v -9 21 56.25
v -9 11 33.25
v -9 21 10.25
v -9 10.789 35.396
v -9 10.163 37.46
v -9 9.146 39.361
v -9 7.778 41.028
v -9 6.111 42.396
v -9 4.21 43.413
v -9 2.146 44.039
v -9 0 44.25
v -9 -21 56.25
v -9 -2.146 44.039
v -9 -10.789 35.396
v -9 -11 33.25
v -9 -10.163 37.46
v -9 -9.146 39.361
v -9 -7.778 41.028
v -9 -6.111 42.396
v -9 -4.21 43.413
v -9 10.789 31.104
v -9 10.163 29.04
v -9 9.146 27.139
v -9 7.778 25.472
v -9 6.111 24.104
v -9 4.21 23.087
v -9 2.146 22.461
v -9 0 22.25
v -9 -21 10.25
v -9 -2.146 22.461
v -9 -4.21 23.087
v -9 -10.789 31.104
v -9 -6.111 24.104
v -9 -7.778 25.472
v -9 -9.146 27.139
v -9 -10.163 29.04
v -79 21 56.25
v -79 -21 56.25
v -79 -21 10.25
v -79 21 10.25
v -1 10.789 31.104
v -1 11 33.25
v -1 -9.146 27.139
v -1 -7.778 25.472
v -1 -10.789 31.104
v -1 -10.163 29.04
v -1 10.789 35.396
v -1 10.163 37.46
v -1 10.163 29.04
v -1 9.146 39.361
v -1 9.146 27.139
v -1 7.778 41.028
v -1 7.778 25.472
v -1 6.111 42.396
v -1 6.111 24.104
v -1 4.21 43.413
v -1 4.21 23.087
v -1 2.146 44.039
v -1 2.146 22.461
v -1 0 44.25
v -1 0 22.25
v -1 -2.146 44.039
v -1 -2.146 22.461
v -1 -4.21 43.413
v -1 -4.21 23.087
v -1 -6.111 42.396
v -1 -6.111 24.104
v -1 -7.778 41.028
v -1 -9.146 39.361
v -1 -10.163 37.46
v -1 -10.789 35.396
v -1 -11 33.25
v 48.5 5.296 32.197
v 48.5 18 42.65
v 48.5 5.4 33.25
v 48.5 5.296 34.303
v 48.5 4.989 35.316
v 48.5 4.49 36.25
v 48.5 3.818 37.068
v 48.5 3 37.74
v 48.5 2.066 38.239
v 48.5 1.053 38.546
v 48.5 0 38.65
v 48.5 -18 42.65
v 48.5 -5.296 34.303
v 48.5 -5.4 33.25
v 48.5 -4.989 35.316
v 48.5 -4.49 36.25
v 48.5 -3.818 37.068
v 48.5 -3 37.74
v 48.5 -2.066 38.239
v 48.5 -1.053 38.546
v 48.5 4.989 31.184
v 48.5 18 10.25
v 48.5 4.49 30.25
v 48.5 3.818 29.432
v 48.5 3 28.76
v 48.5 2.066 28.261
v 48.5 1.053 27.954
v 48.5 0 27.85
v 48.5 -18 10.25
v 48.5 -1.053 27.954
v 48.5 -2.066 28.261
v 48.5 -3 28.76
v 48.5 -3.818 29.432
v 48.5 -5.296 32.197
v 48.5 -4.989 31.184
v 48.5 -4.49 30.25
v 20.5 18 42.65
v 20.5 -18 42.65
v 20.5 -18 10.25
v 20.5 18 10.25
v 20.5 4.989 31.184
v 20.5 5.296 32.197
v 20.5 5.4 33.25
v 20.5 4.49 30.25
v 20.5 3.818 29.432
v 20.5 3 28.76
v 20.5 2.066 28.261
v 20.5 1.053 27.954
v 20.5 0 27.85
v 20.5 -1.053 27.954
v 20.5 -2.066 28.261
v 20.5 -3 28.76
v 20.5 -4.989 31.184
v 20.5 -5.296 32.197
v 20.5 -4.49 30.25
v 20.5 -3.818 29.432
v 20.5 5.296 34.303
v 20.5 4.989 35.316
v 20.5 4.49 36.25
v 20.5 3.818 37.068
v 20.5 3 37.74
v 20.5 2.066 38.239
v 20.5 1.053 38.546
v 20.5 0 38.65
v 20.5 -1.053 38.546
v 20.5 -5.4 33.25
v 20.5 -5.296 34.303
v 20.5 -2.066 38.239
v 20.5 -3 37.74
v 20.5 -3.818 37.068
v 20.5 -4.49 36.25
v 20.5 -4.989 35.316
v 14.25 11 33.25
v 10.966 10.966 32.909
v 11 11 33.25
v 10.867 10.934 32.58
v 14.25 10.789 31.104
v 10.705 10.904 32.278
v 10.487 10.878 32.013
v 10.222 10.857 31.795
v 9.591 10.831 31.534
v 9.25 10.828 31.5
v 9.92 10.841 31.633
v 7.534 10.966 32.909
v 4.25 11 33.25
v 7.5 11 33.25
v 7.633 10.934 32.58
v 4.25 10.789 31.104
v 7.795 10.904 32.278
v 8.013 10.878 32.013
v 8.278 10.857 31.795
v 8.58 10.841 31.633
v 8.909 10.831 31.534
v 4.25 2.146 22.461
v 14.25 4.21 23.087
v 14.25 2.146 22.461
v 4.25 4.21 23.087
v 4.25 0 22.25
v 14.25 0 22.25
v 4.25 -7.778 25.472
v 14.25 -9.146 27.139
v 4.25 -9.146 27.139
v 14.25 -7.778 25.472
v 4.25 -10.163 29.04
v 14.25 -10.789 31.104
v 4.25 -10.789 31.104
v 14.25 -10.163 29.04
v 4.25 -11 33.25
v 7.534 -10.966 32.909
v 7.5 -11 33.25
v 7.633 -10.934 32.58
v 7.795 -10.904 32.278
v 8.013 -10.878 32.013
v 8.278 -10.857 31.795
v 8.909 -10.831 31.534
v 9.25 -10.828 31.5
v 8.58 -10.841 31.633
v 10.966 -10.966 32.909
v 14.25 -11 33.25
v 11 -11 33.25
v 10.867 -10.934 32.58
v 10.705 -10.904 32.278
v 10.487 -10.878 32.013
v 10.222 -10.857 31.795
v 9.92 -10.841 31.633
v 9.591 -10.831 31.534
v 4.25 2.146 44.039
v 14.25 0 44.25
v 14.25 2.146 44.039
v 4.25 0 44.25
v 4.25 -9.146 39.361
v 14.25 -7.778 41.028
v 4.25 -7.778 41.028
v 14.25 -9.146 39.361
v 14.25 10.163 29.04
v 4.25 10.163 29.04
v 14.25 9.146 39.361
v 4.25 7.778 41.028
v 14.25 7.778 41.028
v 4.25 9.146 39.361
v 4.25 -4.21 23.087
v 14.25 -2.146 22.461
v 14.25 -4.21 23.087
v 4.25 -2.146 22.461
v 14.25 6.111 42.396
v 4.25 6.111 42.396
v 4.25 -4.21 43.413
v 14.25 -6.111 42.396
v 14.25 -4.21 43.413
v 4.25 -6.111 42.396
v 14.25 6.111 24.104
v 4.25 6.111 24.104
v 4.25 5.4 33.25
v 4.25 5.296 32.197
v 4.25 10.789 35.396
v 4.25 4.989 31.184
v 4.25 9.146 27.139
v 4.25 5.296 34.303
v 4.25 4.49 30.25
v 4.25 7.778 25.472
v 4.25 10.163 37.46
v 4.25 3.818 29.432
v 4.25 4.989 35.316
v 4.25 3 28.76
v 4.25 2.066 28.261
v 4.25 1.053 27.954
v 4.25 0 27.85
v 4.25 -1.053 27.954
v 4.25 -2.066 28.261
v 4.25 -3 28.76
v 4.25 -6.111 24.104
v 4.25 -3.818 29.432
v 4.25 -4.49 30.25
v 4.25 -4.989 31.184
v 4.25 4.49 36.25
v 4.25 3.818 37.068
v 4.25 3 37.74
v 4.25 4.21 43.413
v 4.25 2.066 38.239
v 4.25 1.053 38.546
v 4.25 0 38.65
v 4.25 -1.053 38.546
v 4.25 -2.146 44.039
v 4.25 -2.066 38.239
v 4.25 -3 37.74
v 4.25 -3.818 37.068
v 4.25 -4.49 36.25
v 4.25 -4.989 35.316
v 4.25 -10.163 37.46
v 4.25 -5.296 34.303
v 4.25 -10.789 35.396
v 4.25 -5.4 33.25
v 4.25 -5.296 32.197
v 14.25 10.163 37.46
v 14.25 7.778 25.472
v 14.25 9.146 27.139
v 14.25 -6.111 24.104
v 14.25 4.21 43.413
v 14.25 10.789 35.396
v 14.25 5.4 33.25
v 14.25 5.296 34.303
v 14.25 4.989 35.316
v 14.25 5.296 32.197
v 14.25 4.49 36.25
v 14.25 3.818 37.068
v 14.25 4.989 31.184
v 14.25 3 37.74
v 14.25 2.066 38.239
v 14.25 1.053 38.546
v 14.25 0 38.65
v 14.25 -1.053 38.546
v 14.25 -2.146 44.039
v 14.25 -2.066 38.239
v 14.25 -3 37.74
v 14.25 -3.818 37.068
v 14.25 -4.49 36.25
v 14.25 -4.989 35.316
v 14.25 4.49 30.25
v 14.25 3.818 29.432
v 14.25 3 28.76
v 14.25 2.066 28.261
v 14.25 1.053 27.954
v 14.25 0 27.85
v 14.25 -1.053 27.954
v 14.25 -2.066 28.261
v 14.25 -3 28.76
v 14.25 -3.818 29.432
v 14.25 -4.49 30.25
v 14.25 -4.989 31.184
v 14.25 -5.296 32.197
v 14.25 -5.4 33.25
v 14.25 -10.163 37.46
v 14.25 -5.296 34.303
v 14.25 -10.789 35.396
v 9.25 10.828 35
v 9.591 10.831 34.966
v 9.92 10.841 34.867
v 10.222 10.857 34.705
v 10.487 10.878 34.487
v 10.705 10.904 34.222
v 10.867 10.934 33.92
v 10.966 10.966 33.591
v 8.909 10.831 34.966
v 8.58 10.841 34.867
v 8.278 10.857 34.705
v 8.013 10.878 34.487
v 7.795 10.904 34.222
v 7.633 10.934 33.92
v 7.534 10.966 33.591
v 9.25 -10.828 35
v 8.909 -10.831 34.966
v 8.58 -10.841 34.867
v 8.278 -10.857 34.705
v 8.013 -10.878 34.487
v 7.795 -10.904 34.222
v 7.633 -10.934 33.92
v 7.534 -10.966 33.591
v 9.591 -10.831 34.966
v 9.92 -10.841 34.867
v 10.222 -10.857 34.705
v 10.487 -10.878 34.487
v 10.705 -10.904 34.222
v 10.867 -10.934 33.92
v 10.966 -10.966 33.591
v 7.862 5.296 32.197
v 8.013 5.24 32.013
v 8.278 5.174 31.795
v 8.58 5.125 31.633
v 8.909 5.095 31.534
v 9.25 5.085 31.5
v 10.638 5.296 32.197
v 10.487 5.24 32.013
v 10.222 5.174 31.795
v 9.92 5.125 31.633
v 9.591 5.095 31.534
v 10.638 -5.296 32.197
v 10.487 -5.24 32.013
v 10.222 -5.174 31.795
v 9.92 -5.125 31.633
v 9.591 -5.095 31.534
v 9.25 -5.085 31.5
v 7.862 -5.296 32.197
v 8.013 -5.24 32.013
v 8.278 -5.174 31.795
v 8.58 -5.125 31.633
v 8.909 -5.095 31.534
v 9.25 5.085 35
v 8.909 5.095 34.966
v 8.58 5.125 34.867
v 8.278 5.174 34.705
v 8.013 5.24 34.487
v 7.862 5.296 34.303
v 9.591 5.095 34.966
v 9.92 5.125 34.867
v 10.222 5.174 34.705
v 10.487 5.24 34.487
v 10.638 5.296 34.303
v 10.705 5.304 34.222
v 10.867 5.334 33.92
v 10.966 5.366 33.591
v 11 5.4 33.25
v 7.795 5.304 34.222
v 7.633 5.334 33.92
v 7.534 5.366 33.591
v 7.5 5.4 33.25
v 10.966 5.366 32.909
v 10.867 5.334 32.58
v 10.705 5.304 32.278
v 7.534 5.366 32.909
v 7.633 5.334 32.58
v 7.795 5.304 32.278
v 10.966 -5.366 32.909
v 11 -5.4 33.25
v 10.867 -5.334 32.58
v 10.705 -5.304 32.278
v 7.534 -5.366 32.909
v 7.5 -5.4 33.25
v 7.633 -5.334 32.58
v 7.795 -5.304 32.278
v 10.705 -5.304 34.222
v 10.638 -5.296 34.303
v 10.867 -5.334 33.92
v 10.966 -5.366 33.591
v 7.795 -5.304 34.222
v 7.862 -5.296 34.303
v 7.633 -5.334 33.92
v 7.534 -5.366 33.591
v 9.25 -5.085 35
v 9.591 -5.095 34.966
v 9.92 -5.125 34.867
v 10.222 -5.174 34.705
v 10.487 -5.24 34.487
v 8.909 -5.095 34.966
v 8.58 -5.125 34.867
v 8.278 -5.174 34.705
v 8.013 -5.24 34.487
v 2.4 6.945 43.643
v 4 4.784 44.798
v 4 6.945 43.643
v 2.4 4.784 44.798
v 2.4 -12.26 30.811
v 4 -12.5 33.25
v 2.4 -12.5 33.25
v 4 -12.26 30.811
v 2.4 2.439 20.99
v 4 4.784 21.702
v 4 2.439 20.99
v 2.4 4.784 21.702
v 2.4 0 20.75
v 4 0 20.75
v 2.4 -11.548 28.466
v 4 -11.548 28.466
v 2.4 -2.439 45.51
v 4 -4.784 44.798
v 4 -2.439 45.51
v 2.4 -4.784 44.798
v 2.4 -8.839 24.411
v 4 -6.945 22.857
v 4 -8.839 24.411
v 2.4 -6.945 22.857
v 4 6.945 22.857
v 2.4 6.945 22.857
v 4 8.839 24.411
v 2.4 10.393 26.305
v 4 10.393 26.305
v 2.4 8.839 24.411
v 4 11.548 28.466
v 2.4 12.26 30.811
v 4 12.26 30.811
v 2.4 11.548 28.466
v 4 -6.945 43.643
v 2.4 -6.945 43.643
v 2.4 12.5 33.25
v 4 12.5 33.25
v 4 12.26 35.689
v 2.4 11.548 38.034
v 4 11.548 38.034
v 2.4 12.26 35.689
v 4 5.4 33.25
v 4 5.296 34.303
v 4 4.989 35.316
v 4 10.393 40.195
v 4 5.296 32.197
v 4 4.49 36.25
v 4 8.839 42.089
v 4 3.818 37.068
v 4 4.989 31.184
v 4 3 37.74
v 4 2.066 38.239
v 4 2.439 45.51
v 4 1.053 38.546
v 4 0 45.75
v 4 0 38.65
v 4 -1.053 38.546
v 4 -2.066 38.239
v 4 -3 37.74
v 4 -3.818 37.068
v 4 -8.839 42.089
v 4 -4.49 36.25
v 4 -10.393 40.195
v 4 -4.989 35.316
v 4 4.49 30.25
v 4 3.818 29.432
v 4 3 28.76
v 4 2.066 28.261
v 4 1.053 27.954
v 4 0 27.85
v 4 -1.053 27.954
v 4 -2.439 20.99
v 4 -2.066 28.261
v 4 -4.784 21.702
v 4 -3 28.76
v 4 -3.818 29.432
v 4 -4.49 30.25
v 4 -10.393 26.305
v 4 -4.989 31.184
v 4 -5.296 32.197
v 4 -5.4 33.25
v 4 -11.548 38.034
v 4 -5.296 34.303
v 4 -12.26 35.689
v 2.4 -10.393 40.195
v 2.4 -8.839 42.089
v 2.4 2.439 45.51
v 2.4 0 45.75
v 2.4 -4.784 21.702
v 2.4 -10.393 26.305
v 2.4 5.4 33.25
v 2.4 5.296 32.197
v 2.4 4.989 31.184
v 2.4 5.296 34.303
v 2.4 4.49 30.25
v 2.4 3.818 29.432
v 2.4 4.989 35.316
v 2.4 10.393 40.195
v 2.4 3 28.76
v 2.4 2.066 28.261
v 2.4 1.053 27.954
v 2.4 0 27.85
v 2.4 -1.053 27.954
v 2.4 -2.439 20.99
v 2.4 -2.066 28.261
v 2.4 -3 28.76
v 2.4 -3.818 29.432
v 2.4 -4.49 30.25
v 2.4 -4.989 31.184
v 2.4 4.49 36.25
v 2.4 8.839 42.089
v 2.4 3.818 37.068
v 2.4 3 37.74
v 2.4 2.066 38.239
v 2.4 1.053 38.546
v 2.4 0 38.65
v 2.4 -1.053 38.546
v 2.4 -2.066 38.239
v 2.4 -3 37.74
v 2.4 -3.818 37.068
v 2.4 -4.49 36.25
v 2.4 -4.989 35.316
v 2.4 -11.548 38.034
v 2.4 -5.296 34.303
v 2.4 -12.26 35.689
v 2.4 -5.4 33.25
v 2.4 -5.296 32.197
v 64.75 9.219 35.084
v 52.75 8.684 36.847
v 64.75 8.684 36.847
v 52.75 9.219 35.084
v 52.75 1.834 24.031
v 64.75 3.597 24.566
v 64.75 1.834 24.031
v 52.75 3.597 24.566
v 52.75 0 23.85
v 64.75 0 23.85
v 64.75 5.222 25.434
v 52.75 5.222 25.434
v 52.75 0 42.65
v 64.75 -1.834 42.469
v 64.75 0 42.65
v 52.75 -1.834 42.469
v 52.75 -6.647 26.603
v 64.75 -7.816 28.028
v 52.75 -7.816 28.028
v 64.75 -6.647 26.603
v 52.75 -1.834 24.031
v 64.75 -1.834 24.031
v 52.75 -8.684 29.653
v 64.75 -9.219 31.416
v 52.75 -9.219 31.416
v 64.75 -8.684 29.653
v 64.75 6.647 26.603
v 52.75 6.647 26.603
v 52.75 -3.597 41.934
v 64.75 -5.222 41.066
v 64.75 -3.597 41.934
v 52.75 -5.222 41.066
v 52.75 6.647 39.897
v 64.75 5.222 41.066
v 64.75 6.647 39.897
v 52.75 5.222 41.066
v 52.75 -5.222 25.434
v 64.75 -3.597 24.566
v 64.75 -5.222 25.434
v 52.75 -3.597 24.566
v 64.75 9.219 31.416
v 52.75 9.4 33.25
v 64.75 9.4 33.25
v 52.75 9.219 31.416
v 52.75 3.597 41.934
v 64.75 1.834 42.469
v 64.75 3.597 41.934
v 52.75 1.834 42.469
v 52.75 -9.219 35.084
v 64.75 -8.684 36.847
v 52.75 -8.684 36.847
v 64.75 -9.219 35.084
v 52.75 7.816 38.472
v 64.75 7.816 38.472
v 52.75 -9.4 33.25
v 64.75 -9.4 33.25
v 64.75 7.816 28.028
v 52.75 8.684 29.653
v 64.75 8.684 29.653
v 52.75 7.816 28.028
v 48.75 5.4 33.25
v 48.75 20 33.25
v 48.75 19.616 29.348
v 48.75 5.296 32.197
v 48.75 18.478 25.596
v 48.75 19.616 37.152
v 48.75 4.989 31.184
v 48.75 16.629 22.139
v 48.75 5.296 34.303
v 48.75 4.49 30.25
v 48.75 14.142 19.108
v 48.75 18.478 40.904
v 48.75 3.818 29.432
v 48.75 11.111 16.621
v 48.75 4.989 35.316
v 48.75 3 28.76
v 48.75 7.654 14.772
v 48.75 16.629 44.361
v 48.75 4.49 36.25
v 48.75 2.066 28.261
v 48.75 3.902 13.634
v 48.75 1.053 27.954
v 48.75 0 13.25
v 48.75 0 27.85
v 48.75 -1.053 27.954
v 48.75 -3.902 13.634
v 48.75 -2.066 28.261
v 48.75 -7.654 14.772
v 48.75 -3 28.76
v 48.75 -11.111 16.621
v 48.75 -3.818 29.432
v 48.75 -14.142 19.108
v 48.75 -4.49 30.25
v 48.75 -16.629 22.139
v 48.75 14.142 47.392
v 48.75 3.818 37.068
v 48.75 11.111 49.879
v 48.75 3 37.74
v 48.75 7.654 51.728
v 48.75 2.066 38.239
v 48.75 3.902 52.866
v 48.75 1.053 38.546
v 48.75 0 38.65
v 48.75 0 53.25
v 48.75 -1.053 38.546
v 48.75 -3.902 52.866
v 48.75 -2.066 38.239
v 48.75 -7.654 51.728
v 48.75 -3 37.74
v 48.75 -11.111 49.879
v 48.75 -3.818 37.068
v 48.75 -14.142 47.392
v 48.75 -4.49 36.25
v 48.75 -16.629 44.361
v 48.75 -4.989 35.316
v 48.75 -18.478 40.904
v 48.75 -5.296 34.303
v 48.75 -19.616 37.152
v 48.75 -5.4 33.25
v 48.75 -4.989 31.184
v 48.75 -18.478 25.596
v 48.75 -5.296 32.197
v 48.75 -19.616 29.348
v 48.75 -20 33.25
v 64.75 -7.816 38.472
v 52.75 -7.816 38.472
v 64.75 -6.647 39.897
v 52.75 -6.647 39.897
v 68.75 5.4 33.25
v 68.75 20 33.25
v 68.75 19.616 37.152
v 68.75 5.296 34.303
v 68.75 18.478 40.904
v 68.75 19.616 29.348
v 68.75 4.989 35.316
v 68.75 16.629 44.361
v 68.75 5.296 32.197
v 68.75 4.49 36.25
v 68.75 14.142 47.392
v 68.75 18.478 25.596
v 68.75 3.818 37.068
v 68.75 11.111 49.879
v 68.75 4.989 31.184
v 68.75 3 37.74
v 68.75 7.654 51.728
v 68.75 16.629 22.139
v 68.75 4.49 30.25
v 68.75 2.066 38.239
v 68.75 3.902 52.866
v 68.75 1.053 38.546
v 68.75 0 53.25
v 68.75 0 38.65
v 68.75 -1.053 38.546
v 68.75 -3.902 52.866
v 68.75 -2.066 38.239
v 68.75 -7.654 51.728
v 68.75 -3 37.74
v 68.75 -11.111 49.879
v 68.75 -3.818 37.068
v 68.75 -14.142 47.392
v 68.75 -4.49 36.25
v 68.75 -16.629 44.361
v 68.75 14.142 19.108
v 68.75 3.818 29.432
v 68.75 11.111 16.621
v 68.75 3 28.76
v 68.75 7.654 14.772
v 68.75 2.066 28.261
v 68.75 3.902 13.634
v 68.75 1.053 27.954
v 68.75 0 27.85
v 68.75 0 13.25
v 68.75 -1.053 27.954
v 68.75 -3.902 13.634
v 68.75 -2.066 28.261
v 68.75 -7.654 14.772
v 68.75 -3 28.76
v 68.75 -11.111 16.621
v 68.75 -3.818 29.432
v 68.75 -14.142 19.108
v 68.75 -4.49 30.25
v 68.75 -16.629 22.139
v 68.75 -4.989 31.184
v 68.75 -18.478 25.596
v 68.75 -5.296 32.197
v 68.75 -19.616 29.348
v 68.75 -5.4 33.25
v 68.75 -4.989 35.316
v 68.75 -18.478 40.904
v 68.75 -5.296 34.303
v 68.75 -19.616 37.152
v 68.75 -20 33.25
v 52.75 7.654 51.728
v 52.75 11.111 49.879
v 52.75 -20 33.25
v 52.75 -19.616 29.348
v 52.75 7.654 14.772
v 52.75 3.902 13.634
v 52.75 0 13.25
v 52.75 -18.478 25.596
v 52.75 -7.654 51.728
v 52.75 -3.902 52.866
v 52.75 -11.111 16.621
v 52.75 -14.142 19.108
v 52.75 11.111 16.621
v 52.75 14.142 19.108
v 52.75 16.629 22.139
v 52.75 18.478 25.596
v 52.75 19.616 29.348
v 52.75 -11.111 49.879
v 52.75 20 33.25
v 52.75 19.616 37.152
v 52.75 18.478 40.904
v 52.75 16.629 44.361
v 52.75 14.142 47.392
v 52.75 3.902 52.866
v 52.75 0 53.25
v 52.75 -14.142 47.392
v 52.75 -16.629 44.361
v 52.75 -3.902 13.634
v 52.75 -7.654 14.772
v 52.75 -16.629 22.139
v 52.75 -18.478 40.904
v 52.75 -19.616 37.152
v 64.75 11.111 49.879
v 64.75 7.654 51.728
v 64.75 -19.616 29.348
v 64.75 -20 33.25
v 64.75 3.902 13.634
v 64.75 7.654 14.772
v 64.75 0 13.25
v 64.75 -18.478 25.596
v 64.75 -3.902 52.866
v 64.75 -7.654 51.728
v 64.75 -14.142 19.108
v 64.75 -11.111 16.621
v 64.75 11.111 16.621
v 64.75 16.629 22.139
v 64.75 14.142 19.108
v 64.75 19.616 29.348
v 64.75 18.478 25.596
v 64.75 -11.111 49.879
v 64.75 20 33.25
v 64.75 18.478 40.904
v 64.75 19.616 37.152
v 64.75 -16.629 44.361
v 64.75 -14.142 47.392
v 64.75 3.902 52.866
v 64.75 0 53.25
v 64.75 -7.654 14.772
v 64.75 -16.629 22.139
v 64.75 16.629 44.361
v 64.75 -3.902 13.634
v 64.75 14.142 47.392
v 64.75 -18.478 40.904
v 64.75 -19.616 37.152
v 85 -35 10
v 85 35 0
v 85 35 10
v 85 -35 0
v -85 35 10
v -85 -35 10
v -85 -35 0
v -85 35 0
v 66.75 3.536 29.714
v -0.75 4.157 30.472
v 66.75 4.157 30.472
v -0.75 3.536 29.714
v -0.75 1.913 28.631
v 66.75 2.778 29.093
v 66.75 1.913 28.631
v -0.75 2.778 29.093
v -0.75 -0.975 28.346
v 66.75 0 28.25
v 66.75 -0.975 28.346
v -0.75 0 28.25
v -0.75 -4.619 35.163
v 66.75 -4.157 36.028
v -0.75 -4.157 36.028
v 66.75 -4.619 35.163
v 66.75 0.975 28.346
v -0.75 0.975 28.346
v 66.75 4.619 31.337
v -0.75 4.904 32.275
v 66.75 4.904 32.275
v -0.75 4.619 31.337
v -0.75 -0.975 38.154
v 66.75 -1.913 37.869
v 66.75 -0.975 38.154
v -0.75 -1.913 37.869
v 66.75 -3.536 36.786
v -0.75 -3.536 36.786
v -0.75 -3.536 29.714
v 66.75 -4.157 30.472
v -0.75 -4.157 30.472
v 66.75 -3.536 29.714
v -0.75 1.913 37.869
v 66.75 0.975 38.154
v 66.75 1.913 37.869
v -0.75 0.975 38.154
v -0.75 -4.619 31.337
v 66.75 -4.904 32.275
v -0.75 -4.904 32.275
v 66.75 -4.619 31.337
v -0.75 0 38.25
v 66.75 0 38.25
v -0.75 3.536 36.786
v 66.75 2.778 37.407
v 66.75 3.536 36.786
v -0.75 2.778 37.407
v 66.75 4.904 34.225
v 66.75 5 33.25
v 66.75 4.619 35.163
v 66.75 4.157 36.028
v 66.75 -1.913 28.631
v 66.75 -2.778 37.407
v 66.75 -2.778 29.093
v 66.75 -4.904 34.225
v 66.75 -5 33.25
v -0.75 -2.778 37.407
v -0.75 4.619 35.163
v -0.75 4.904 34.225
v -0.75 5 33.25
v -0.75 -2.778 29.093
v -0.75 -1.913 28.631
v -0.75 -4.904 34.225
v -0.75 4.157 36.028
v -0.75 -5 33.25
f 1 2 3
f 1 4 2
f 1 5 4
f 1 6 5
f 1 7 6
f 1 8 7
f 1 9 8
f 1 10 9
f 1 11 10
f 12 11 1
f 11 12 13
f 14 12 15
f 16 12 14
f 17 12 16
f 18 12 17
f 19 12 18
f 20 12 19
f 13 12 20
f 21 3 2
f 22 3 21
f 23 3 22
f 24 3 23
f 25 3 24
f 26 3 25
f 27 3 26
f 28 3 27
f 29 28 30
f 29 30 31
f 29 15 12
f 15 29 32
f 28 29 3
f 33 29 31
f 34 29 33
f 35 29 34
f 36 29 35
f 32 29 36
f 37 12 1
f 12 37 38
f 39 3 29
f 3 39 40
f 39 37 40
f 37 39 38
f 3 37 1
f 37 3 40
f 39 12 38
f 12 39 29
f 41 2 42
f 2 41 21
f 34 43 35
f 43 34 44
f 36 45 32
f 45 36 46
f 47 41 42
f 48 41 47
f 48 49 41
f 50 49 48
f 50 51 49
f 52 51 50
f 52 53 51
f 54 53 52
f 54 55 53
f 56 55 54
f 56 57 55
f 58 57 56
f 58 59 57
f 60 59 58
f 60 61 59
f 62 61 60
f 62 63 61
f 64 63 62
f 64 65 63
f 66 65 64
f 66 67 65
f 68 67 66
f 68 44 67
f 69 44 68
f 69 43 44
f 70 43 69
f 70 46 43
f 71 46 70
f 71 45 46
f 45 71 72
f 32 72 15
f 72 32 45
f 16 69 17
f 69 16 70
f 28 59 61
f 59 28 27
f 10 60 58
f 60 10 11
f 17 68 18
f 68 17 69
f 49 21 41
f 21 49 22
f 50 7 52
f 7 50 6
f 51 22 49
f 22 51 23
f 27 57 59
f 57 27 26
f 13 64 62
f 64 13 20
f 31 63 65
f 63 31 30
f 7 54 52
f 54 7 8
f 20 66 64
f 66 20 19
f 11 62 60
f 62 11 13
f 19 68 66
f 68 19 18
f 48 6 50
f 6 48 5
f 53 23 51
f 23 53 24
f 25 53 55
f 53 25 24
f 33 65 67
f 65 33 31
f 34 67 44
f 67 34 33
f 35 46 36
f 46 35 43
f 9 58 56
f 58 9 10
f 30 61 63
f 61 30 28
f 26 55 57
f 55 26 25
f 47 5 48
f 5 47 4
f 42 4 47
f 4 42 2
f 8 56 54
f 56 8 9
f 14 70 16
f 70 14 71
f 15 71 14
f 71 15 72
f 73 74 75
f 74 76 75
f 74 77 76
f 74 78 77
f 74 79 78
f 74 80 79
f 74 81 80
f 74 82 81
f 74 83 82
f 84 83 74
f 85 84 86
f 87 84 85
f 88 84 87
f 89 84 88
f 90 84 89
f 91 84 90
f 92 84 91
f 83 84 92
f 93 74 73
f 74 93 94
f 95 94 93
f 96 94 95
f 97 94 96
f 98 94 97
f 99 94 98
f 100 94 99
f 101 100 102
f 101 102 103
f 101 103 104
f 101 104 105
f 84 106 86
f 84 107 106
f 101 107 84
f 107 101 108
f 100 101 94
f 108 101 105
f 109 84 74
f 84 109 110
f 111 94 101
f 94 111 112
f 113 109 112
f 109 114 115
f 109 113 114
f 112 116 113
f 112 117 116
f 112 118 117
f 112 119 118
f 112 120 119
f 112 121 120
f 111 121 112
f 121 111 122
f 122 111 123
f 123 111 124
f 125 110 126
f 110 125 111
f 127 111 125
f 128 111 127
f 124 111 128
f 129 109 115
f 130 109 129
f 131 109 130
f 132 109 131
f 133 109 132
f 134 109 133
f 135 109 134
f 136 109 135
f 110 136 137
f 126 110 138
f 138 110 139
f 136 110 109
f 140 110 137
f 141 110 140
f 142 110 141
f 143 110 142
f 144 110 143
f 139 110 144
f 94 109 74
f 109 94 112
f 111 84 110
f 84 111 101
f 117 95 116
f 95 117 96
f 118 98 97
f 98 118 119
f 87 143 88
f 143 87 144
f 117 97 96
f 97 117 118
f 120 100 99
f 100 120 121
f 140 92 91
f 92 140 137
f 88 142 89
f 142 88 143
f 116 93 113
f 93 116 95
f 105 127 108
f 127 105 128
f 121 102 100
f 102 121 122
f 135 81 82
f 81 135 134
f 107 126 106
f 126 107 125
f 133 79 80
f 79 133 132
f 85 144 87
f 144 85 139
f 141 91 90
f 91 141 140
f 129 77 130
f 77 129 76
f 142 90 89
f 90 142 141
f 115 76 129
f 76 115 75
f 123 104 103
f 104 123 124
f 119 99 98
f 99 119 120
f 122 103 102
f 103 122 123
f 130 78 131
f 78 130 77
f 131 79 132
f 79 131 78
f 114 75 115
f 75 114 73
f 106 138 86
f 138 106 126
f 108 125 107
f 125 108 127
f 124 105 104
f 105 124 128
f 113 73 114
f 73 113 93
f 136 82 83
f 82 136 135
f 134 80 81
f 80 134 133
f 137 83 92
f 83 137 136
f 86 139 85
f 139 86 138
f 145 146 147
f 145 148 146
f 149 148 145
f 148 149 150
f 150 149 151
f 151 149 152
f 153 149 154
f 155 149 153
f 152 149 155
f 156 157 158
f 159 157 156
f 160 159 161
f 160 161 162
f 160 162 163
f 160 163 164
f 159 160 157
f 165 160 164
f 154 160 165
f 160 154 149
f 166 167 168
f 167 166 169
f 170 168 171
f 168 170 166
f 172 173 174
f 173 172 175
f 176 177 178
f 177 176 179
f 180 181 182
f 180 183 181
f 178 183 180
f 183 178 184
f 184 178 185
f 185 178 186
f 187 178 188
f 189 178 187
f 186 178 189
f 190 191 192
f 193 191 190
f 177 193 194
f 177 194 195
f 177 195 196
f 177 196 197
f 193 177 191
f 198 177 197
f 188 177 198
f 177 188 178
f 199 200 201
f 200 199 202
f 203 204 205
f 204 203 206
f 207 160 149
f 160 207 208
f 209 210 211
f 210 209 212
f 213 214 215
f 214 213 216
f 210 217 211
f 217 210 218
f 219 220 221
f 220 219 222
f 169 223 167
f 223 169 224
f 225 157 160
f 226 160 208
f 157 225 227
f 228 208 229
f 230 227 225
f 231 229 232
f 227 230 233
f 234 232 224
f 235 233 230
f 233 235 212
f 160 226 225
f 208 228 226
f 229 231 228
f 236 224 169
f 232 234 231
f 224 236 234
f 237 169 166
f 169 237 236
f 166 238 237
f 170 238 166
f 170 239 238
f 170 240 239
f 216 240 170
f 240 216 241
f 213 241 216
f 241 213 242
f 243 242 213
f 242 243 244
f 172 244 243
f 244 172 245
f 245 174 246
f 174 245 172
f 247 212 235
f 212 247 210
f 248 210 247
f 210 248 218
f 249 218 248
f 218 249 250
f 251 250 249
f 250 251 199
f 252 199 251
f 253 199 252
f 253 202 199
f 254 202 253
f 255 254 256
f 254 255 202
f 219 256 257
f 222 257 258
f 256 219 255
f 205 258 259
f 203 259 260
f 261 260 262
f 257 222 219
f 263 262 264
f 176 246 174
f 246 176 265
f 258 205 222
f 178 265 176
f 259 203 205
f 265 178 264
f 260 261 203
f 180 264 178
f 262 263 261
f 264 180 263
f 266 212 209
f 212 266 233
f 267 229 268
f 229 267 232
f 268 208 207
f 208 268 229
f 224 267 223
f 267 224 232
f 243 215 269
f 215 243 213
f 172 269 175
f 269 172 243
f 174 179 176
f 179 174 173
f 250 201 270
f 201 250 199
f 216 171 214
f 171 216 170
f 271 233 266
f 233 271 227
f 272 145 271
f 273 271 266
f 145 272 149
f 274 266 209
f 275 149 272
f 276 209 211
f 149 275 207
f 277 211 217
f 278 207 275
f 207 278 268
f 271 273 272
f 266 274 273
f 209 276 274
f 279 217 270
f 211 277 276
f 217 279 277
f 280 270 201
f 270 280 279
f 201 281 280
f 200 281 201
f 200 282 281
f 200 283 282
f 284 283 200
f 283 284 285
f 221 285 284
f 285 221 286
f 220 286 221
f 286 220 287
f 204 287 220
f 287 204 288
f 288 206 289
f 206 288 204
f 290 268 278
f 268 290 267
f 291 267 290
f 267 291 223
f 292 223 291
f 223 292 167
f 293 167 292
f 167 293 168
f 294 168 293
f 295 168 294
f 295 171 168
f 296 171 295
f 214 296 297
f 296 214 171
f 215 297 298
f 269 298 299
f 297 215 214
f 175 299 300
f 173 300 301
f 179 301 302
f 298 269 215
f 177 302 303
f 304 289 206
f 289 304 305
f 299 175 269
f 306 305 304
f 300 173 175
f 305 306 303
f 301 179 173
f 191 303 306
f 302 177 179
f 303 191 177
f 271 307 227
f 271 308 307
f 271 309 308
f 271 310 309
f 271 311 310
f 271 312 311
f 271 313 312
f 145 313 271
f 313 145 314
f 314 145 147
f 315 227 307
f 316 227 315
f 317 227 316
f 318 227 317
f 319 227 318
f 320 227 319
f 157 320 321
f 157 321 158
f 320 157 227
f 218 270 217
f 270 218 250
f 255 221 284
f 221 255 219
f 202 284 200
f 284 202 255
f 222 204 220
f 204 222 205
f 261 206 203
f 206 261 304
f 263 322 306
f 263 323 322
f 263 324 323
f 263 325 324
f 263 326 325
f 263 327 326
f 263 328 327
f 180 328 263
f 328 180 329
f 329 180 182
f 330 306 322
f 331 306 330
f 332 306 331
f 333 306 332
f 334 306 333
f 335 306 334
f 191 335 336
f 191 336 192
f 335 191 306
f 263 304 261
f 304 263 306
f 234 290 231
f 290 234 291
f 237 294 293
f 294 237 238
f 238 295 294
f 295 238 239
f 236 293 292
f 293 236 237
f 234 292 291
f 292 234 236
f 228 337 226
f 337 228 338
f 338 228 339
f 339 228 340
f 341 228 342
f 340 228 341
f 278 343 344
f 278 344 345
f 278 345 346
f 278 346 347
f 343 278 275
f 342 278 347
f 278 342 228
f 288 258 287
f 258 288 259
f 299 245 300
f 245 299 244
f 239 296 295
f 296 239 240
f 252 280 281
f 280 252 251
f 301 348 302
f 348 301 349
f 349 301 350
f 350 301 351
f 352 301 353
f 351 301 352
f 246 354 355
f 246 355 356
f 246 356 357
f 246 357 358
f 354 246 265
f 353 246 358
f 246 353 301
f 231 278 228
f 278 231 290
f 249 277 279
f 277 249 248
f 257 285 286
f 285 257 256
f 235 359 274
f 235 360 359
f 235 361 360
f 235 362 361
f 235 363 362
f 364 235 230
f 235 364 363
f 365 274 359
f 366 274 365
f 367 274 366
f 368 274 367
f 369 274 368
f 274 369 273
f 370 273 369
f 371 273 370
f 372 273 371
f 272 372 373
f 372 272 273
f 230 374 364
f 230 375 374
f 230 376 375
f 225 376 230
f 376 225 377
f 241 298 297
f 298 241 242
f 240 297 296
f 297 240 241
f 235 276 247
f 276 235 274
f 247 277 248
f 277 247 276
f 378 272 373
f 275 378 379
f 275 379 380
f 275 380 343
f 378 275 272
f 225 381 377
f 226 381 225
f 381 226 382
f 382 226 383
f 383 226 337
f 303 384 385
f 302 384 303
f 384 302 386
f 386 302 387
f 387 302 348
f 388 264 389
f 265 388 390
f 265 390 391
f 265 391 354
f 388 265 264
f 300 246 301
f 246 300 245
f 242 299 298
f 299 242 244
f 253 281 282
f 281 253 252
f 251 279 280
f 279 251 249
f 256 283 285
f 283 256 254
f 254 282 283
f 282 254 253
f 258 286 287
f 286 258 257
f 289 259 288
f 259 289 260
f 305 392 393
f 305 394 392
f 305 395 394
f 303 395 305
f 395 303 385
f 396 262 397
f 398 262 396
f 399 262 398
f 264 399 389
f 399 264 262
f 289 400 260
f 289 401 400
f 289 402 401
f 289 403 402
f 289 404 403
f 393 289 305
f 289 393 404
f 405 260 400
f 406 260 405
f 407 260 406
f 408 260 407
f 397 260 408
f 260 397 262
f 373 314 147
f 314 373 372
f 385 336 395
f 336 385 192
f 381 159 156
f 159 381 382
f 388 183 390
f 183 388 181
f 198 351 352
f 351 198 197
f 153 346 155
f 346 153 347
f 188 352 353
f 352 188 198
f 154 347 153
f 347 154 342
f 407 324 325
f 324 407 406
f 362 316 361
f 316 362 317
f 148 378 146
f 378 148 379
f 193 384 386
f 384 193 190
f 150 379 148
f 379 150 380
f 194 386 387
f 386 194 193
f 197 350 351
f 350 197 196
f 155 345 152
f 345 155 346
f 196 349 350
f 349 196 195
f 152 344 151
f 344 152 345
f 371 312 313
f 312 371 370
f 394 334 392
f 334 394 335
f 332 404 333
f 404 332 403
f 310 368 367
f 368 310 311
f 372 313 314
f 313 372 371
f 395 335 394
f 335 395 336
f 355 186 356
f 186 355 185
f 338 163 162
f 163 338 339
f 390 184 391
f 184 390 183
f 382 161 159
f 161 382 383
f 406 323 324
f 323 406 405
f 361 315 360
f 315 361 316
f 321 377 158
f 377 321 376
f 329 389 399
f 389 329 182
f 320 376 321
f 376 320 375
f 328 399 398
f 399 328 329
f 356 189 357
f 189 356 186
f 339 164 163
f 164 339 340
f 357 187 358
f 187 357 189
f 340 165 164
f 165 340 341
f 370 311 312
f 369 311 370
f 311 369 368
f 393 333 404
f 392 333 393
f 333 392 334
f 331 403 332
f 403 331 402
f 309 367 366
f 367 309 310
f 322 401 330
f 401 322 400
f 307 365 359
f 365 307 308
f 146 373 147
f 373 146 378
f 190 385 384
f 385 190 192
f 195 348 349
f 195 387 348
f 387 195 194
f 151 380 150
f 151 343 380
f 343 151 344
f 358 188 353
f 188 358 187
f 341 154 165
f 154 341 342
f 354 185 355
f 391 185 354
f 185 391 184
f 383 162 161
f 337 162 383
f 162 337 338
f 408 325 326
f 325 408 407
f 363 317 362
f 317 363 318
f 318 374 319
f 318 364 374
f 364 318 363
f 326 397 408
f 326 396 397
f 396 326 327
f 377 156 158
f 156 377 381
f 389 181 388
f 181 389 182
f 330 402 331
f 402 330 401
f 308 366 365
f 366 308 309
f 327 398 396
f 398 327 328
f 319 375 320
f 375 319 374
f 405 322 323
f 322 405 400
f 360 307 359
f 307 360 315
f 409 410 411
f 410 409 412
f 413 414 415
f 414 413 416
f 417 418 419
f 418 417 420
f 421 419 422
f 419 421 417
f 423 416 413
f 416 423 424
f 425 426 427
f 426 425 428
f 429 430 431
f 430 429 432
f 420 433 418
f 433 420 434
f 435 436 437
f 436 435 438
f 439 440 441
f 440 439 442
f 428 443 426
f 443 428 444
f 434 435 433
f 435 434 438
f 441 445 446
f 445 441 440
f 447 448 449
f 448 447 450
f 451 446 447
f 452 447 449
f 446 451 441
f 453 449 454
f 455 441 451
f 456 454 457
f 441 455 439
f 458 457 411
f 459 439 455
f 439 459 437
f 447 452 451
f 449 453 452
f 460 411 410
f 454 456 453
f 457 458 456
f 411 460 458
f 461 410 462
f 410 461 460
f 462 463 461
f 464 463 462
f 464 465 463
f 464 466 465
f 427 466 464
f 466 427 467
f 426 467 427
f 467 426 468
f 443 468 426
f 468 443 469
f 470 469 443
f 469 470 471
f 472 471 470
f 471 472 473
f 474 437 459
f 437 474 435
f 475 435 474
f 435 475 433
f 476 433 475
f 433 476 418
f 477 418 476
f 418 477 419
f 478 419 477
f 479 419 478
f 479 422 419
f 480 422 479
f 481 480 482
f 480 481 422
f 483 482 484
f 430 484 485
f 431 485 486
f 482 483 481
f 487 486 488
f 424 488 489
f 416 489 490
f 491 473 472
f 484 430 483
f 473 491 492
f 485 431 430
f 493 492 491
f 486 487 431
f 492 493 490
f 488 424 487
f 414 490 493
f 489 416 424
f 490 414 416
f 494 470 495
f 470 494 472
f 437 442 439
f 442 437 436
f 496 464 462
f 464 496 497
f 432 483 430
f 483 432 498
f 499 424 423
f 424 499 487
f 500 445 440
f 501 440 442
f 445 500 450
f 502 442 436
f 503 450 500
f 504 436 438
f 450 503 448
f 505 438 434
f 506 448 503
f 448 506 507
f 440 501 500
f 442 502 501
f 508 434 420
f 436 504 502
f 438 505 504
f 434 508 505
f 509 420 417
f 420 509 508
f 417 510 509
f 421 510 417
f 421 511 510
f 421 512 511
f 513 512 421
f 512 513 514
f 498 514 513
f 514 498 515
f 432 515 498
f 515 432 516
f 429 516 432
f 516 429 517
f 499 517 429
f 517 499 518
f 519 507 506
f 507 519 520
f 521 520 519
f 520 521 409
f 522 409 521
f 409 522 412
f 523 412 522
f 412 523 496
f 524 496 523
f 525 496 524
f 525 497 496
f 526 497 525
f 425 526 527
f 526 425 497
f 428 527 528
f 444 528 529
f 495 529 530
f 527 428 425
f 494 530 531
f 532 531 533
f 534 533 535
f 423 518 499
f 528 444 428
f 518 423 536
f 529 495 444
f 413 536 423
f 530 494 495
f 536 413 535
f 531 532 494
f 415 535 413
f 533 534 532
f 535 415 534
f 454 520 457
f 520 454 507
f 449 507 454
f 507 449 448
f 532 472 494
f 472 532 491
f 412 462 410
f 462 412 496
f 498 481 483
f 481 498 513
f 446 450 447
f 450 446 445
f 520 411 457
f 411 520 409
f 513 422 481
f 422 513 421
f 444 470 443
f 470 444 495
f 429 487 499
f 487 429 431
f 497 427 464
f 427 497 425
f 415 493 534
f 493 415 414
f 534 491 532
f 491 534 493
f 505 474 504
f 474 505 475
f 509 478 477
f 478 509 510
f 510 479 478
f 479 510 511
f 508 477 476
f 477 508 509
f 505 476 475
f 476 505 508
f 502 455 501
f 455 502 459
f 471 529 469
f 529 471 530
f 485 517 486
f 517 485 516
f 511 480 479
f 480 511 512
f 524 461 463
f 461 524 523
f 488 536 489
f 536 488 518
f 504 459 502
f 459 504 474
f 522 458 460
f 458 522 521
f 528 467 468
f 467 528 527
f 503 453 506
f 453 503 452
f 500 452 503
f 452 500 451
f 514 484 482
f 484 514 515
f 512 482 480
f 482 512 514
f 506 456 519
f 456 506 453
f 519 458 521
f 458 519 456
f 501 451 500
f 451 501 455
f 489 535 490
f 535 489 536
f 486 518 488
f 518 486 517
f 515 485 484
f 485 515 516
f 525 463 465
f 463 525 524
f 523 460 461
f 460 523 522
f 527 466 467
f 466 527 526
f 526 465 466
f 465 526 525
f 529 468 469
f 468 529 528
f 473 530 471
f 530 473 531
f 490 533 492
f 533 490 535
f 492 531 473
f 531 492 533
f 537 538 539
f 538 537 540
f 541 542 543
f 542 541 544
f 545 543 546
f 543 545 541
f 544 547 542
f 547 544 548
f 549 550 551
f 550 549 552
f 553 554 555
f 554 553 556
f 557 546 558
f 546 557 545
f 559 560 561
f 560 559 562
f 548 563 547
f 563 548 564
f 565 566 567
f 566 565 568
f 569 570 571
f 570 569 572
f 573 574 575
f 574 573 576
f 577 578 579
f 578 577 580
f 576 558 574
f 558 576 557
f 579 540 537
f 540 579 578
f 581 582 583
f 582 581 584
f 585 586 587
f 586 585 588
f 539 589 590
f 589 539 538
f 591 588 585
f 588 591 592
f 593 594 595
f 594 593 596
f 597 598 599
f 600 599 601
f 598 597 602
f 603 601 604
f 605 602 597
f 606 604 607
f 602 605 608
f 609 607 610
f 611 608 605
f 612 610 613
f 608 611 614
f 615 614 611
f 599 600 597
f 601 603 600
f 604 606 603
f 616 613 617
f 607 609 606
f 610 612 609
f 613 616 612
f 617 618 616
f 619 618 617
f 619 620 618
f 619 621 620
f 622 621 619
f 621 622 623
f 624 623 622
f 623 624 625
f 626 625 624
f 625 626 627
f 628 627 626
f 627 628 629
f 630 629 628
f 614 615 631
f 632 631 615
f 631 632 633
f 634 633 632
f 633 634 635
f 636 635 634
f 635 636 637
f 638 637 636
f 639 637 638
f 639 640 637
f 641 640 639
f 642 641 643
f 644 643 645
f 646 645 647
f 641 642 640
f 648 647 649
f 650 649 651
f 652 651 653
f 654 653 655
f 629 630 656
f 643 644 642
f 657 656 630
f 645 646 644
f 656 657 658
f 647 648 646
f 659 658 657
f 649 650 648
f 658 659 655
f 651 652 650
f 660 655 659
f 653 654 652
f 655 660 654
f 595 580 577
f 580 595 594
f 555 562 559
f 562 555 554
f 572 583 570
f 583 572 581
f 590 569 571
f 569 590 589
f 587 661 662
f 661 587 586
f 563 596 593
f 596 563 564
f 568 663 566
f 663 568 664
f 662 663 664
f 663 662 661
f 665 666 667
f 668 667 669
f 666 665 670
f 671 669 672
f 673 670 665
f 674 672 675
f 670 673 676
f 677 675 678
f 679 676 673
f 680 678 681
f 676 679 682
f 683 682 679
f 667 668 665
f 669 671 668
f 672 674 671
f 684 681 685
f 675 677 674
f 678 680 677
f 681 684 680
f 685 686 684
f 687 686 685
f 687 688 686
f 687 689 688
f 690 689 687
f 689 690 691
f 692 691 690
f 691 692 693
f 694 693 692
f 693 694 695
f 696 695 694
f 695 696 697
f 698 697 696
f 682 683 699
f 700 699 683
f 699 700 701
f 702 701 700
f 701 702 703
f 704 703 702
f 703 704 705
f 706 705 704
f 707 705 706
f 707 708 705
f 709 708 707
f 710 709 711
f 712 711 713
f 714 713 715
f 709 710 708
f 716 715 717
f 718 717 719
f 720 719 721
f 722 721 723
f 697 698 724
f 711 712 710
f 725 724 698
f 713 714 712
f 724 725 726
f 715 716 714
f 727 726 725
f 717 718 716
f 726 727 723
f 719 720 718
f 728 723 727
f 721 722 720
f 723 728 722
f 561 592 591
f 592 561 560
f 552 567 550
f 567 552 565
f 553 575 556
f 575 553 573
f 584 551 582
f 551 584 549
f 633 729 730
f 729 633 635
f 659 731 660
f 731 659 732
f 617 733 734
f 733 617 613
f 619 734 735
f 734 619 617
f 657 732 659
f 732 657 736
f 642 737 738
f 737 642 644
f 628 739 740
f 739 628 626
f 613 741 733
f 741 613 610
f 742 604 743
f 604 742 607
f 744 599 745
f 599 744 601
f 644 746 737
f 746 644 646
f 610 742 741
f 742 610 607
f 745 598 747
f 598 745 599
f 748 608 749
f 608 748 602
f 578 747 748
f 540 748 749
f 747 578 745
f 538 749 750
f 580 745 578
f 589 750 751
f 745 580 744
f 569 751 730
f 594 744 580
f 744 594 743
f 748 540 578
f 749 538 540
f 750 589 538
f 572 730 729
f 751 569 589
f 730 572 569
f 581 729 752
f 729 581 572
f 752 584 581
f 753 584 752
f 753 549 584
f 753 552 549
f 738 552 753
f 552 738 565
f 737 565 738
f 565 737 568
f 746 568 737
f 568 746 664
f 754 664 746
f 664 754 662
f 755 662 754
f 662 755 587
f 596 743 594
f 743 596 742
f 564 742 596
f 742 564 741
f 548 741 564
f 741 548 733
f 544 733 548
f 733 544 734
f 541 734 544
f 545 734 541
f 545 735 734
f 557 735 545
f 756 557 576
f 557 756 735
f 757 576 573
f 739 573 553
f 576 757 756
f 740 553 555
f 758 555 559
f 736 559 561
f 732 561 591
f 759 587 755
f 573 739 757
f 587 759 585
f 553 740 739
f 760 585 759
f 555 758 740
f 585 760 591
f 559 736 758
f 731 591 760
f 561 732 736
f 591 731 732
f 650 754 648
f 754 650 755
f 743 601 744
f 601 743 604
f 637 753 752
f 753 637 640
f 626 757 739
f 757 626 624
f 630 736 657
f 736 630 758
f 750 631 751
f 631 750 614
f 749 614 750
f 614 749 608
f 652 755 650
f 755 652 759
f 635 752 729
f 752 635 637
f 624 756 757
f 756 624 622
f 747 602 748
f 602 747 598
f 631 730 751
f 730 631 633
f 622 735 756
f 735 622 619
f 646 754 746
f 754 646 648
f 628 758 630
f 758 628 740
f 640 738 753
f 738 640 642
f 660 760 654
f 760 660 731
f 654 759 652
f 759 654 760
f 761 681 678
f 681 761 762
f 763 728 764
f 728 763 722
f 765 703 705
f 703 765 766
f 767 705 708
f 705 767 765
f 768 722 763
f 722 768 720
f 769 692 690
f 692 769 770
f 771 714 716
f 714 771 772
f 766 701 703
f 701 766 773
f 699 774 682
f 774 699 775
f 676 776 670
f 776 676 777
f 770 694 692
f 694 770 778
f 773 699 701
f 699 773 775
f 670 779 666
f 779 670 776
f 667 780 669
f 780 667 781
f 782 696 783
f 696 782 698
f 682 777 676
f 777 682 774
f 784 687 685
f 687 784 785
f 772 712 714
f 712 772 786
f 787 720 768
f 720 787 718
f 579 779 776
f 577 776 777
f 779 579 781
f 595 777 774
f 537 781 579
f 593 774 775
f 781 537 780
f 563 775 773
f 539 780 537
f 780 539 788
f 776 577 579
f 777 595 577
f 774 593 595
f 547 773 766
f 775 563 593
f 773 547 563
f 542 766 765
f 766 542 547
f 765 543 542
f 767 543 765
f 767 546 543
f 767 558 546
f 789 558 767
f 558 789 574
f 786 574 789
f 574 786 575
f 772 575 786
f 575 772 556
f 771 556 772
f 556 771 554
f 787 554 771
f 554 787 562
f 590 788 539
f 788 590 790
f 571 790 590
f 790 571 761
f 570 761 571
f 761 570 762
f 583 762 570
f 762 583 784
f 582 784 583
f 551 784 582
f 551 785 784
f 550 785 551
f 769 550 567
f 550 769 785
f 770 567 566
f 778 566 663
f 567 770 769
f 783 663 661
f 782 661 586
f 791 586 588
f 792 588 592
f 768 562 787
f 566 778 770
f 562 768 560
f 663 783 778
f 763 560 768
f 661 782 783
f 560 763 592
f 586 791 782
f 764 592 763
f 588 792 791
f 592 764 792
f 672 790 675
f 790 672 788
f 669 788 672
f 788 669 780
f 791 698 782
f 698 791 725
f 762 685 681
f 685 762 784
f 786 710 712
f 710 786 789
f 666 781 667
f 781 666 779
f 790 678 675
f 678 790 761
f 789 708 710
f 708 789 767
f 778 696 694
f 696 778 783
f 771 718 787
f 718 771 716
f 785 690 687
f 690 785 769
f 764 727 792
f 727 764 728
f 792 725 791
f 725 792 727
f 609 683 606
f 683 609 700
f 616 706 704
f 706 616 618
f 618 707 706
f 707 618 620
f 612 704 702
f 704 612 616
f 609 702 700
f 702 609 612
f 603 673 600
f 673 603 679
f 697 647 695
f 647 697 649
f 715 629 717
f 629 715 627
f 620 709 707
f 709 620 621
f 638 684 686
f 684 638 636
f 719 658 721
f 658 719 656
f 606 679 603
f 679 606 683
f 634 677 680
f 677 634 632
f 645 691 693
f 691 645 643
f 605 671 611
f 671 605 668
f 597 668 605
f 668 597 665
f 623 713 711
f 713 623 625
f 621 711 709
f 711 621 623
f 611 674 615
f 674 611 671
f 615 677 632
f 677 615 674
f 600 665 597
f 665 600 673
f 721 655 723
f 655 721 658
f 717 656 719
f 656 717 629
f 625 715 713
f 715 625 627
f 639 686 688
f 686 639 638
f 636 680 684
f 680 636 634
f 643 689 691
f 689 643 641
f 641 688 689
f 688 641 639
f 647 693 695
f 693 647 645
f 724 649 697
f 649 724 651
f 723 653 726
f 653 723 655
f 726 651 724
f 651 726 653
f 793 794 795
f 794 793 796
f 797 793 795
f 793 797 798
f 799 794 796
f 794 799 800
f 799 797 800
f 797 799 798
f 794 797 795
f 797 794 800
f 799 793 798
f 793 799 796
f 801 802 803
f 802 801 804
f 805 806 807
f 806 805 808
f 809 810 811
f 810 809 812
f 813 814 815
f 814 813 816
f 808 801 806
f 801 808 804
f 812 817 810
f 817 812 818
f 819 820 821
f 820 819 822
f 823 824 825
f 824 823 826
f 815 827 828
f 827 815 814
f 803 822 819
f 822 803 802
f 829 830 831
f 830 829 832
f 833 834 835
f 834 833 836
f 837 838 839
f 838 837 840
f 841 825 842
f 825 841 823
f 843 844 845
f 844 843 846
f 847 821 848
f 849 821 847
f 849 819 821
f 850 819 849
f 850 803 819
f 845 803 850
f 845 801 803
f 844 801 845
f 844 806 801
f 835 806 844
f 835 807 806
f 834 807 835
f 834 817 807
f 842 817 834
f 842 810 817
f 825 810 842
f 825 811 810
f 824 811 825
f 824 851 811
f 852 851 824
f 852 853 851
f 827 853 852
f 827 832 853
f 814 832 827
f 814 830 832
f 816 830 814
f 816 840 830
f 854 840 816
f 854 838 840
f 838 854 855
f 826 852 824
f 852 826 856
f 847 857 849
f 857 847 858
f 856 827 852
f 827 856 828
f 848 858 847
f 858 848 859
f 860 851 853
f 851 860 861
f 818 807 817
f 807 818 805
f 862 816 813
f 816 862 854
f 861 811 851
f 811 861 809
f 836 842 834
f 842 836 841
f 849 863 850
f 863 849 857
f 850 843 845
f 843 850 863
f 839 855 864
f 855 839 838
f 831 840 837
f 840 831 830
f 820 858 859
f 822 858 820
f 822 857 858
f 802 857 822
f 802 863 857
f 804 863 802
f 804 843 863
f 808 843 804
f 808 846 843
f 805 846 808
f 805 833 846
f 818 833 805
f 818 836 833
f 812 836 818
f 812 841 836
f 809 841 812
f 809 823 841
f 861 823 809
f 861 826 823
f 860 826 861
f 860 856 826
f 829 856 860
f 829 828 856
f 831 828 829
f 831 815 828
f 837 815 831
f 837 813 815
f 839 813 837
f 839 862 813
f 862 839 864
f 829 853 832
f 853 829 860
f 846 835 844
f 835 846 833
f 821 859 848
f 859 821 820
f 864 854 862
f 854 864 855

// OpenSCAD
$fn = 32;

// ------------------------------------------------------------------------
// Motor drive station: motor 70 x 46 mm, shaft d10, pulley d40
// Every part is its own module, assembly() places every instance.
// ------------------------------------------------------------------------

// --- part 1 ---
module station_bed() {
  difference() {
    translate([-85, -35, 0]) cube([170, 70, 10]);
  }
}

// --- part 2 ---
module drive_motor() {
  union() {
    translate([-35, -21, 0]) cube([70, 42, 46]);
    translate([39, 0, 23]) rotate([0, 90, 0]) cylinder(h = 8, d = 22, center = true);
  }
}

// --- part 3 ---
module pillow_block() {
  difference() {
    translate([-14, -18, 0]) cube([28, 36, 32.4]);
    translate([0, 0, 23]) rotate([0, 90, 0]) cylinder(h = 30, d = 10.8, center = true);
  }
}

// --- part 4 ---
module drive_shaft() {
  translate([0, 0, -33.75]) cylinder(h = 67.5, d = 10);
}

// --- part 5 ---
module shaft_collar() {
  difference() {
    cylinder(h = 10, d = 22);
    translate([0, 0, -1]) cylinder(h = 12, d = 10.8);
    translate([0, 0, 5]) rotate([90, 0, 0]) cylinder(h = 24, d = 3.5, center = true);
  }
}

// --- part 6 ---
module collar_washer() {
  difference() {
      translate([0, 0, 0]) cylinder(h = 1.6, d = 25);
      translate([0, 0, -1]) cylinder(h = 3.6, d = 10.8);
    }
}

// --- part 7 ---
module drive_pulley() {
  difference() {
    union() {
      cylinder(h = 20, d = 18.8);
      cylinder(h = 4, d = 40);
      translate([0, 0, 16]) cylinder(h = 4, d = 40);
    }
    translate([0, 0, -1]) cylinder(h = 22, d = 10.8);
  }
}

// --- assembly ---
module assembly() {
  color([0.80, 0.24, 0.20]) translate([0, 0, 0]) rotate([0, 0, 0]) station_bed();
  color([0.20, 0.45, 0.75]) translate([-44, 0, 10.25]) rotate([0, 0, 0]) drive_motor();
  color([0.25, 0.62, 0.32]) translate([34.5, 0, 10.25]) rotate([0, 0, 0]) pillow_block();
  color([0.92, 0.70, 0.18]) translate([33, 0, 33.25]) rotate([0, 90, 0]) drive_shaft();
  color([0.58, 0.35, 0.70]) translate([4.25, 0, 33.25]) rotate([0, 90, 0]) shaft_collar();
  color([0.16, 0.66, 0.66]) translate([2.4, 0, 33.25]) rotate([0, 90, 0]) collar_washer();
  color([0.85, 0.48, 0.18]) translate([48.75, 0, 33.25]) rotate([0, 90, 0]) drive_pulley();
}

assembly();
